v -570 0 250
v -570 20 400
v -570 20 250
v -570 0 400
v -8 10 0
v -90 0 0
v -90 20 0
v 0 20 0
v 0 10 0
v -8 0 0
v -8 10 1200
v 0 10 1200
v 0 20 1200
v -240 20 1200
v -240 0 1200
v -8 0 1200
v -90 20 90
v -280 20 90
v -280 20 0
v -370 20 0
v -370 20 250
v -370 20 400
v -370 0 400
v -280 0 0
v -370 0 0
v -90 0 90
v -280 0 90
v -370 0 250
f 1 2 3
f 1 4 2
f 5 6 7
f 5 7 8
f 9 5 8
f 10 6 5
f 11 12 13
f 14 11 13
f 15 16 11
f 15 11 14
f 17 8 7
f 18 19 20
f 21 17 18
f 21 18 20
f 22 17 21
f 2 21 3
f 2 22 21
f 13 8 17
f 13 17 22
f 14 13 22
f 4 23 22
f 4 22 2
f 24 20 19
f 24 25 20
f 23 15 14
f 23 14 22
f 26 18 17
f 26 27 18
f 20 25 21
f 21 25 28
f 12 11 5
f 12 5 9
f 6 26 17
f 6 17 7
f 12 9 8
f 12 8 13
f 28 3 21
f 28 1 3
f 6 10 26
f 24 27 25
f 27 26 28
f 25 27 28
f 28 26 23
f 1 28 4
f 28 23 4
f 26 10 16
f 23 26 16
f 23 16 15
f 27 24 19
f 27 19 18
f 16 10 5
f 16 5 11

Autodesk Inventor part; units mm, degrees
ref_plane "YZ Plane" through (0, 0, 0) normal (1, 0, 0) x (0, 1, 0)
ref_plane "XZ Plane" through (0, 0, 0) normal (0, 1, 0) x (-1, 0, 0)
ref_plane "XY Plane" through (0, 0, 0) normal (0, 0, 1) x (1, 0, 0)
sketch "Sketch1" plane through (0, 0, 0) normal (0, 1, 0) x (-1, 0, 0)
  line L0 (0, 0) -> (0, 1200)
  line L1 (0, 1200) -> (240, 1200)
  line L2 (370, 400) -> (570, 400)
  line L3 (240, 1200) -> (370, 400)
  line L4 (570, 400) -> (570, 250)
  line L5 (570, 250) -> (370, 250)
  line L6 (370, 0) -> (370, 250)
  line L7 (370, 0) -> (280, 0)
  line L8 (280, 0) -> (280, 90)
  line L9 (280, 90) -> (90, 90)
  line L10 (90, 90) -> (90, 0)
  line L11 (90, 0) -> (0, 0)
  dimension "d2" = 1200
  dimension "d4" = 200
  dimension "d8" = 370
  dimension "d9" = 150
  dimension "d10" = 250
  dimension "d11" = 90
  dimension "d12" = 90
  dimension "d13" = 190
  dimension "d14" = 240
extrude "Extrusion1" add sketch "Sketch1" along normal blind 20
sketch "Sketch2" plane through (0, 0, 0) normal (0, -1, 0) x (1, 0, 0)
  line L0 (0, 0) -> (0, 1200) projected
  line L1 (0, 1200) -> (-240, 1200) projected
  line L2 (-240, 1200) -> (-240, 400) projected
  line L3 (-370, 400) -> (-570, 400) projected
  line L4 (-570, 400) -> (-570, 0) projected
  line L5 (-570, 0) -> (0, 0) projected
sketch "Sketch3" plane through (0, 0, 0) normal (0, -1, 0) x (1, 0, 0)
  line L0 (0, 0) -> (0, 1200) projected
  line L1 (0, 1200) -> (-240, 1200) projected
  line L2 (-240, 1200) -> (-370, 400) projected
  line L3 (-370, 400) -> (-570, 400) projected
  line L4 (-570, 400) -> (-570, 250) projected
  line L5 (-570, 250) -> (-370, 250) projected
  line L6 (-370, 250) -> (-370, 0) projected
  line L7 (-370, 0) -> (-280, 0) projected
  line L8 (-280, 0) -> (-280, 90) projected
  line L9 (-280, 90) -> (-90, 90) projected
  line L10 (-90, 90) -> (-90, 0) projected
  line L11 (-90, 0) -> (0, 0) projected
sketch "Sketch4" plane through (0, 0, 0) normal (0, -1, 0) x (1, 0, 0)
  line L0 (0, 0) -> (0, 1200) projected
  line L1 (0, 1200) -> (-240, 1200) projected
  line L2 (0, 0) -> (-8, 0)
  line L3 (-8, 0) -> (-8, 1200)
  line L4 (-8, 1200) -> (0, 1200)
  line L5 (0, 1200) -> (0, 0)
  dimension "d15" = 8
extrude "Extrusion2" cut sketch "Sketch4" against normal blind 10
properties part number "seitenteil"
